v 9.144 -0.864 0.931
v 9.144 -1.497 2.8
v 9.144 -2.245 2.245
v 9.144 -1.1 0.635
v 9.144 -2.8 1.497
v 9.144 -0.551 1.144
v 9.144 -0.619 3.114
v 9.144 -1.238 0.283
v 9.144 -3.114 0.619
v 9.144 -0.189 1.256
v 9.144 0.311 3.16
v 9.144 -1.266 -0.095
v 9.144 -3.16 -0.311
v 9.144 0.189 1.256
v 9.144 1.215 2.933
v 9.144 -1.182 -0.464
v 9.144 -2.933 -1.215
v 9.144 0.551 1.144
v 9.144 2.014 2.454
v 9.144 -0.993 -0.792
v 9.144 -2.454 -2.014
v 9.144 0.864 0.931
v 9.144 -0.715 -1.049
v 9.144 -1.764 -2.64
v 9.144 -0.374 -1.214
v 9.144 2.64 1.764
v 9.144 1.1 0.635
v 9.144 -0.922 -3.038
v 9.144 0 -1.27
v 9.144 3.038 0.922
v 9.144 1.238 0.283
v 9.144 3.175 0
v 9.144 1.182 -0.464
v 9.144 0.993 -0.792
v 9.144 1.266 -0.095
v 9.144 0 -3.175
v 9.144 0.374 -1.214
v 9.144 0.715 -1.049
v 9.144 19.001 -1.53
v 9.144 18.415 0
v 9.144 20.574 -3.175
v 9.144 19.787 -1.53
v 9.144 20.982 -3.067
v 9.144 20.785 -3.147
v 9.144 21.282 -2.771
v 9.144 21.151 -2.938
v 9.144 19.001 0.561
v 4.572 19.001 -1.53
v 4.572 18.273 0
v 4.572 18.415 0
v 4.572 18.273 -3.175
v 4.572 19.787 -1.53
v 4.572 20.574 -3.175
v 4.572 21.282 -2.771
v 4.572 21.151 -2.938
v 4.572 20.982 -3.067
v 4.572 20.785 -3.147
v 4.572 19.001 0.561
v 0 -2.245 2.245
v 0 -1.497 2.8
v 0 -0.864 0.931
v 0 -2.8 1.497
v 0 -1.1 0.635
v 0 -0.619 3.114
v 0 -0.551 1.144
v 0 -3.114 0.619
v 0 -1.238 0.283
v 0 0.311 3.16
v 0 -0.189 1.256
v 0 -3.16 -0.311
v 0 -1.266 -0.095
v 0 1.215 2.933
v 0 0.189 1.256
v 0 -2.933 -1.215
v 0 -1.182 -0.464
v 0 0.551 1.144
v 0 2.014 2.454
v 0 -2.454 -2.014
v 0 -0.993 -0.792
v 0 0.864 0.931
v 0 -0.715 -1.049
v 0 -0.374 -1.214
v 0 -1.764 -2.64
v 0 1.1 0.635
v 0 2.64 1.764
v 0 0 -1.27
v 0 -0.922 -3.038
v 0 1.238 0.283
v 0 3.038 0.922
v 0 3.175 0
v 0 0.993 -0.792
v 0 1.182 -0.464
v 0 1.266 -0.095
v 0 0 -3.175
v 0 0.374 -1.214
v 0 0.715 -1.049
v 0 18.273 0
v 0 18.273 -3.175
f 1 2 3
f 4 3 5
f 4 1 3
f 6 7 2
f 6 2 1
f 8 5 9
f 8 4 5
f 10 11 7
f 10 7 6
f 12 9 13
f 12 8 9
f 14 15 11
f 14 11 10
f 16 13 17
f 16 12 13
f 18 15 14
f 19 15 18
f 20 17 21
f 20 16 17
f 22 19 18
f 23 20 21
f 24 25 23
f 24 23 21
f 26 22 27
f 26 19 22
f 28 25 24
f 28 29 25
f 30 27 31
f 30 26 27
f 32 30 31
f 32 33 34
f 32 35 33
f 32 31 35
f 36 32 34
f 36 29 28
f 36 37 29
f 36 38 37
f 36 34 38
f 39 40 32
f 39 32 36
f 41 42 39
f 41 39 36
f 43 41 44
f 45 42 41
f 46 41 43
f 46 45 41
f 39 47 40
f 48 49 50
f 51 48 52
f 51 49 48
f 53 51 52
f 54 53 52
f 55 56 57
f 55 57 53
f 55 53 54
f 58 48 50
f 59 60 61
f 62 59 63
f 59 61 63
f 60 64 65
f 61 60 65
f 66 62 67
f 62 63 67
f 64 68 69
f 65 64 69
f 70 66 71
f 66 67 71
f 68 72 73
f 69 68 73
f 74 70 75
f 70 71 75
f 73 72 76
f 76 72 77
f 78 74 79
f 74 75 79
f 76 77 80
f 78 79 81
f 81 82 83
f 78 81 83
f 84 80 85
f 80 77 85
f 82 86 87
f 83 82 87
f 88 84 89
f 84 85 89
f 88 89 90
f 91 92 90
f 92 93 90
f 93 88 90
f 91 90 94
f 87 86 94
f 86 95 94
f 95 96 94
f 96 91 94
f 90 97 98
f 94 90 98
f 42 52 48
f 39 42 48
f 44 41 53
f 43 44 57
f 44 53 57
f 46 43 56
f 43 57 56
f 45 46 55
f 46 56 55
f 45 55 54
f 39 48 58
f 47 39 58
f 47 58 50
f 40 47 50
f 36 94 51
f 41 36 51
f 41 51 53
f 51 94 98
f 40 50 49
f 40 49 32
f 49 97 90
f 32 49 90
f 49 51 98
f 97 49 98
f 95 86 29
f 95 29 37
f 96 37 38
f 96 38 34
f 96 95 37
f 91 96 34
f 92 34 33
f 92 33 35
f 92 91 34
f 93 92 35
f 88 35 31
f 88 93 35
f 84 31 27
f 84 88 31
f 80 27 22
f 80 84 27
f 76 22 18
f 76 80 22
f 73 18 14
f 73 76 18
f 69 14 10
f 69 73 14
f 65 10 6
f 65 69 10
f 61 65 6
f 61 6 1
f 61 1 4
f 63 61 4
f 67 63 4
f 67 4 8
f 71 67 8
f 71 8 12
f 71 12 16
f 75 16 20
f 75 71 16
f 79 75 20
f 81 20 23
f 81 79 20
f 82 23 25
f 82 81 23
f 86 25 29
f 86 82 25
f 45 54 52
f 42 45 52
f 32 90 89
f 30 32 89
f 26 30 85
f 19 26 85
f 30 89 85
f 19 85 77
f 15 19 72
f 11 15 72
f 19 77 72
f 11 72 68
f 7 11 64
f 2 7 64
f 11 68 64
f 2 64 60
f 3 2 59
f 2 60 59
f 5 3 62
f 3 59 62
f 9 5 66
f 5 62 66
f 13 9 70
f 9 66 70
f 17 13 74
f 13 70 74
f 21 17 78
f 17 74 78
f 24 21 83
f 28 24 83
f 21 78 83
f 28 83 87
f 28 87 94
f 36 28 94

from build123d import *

# Parameters (mm, degrees)
SKETCH2_R           = 1.27
BOSS_EXTRUDE1_DEPTH = 9.144
SKETCH3_W           = 4.572
SKETCH3_H           = 3.009435793
CUT_EXTRUDE1_DEPTH  = 25.018241396


with BuildPart() as part:
    # Sketch2 → Boss-Extrude1 (new body)
    with BuildSketch(Plane(origin=(0, 0, 0), x_dir=(0, 0, -1), z_dir=(1, 0, 0))):
        with BuildLine():
            Line((0, 18.415), (0, 3.175))
            ThreePointArc((0, 3.175), (-2.24506403, -2.24506403), (3.175, 0))
            Line((3.175, 0), (3.175, 20.574))
            ThreePointArc((3.175, 20.574), (3.066754835, 20.981875221), (2.770508017, 21.282403148))
            Line((2.770508017, 21.282403148), (1.52985297, 19.787480142))
            Line((1.52985297, 19.787480142), (1.52985297, 19.000960284))
            Line((1.52985297, 19.000960284), (-0.561351088, 19.000960284))
            Line((-0.561351088, 19.000960284), (0, 18.415))
        make_face()
        Circle(SKETCH2_R, mode=Mode.SUBTRACT)
    extrude(amount=BOSS_EXTRUDE1_DEPTH)

    # Sketch3 → Cut-Extrude1 (cut, through all)
    with BuildSketch(Plane(origin=(0, 0, -3.175), x_dir=(-1, 0, 0), z_dir=(0, 0, -1))):
        with Locations((-2.286, 19.777685252)):
            Rectangle(SKETCH3_W, SKETCH3_H)
    extrude(amount=-CUT_EXTRUDE1_DEPTH, mode=Mode.SUBTRACT)


solid = part.part
